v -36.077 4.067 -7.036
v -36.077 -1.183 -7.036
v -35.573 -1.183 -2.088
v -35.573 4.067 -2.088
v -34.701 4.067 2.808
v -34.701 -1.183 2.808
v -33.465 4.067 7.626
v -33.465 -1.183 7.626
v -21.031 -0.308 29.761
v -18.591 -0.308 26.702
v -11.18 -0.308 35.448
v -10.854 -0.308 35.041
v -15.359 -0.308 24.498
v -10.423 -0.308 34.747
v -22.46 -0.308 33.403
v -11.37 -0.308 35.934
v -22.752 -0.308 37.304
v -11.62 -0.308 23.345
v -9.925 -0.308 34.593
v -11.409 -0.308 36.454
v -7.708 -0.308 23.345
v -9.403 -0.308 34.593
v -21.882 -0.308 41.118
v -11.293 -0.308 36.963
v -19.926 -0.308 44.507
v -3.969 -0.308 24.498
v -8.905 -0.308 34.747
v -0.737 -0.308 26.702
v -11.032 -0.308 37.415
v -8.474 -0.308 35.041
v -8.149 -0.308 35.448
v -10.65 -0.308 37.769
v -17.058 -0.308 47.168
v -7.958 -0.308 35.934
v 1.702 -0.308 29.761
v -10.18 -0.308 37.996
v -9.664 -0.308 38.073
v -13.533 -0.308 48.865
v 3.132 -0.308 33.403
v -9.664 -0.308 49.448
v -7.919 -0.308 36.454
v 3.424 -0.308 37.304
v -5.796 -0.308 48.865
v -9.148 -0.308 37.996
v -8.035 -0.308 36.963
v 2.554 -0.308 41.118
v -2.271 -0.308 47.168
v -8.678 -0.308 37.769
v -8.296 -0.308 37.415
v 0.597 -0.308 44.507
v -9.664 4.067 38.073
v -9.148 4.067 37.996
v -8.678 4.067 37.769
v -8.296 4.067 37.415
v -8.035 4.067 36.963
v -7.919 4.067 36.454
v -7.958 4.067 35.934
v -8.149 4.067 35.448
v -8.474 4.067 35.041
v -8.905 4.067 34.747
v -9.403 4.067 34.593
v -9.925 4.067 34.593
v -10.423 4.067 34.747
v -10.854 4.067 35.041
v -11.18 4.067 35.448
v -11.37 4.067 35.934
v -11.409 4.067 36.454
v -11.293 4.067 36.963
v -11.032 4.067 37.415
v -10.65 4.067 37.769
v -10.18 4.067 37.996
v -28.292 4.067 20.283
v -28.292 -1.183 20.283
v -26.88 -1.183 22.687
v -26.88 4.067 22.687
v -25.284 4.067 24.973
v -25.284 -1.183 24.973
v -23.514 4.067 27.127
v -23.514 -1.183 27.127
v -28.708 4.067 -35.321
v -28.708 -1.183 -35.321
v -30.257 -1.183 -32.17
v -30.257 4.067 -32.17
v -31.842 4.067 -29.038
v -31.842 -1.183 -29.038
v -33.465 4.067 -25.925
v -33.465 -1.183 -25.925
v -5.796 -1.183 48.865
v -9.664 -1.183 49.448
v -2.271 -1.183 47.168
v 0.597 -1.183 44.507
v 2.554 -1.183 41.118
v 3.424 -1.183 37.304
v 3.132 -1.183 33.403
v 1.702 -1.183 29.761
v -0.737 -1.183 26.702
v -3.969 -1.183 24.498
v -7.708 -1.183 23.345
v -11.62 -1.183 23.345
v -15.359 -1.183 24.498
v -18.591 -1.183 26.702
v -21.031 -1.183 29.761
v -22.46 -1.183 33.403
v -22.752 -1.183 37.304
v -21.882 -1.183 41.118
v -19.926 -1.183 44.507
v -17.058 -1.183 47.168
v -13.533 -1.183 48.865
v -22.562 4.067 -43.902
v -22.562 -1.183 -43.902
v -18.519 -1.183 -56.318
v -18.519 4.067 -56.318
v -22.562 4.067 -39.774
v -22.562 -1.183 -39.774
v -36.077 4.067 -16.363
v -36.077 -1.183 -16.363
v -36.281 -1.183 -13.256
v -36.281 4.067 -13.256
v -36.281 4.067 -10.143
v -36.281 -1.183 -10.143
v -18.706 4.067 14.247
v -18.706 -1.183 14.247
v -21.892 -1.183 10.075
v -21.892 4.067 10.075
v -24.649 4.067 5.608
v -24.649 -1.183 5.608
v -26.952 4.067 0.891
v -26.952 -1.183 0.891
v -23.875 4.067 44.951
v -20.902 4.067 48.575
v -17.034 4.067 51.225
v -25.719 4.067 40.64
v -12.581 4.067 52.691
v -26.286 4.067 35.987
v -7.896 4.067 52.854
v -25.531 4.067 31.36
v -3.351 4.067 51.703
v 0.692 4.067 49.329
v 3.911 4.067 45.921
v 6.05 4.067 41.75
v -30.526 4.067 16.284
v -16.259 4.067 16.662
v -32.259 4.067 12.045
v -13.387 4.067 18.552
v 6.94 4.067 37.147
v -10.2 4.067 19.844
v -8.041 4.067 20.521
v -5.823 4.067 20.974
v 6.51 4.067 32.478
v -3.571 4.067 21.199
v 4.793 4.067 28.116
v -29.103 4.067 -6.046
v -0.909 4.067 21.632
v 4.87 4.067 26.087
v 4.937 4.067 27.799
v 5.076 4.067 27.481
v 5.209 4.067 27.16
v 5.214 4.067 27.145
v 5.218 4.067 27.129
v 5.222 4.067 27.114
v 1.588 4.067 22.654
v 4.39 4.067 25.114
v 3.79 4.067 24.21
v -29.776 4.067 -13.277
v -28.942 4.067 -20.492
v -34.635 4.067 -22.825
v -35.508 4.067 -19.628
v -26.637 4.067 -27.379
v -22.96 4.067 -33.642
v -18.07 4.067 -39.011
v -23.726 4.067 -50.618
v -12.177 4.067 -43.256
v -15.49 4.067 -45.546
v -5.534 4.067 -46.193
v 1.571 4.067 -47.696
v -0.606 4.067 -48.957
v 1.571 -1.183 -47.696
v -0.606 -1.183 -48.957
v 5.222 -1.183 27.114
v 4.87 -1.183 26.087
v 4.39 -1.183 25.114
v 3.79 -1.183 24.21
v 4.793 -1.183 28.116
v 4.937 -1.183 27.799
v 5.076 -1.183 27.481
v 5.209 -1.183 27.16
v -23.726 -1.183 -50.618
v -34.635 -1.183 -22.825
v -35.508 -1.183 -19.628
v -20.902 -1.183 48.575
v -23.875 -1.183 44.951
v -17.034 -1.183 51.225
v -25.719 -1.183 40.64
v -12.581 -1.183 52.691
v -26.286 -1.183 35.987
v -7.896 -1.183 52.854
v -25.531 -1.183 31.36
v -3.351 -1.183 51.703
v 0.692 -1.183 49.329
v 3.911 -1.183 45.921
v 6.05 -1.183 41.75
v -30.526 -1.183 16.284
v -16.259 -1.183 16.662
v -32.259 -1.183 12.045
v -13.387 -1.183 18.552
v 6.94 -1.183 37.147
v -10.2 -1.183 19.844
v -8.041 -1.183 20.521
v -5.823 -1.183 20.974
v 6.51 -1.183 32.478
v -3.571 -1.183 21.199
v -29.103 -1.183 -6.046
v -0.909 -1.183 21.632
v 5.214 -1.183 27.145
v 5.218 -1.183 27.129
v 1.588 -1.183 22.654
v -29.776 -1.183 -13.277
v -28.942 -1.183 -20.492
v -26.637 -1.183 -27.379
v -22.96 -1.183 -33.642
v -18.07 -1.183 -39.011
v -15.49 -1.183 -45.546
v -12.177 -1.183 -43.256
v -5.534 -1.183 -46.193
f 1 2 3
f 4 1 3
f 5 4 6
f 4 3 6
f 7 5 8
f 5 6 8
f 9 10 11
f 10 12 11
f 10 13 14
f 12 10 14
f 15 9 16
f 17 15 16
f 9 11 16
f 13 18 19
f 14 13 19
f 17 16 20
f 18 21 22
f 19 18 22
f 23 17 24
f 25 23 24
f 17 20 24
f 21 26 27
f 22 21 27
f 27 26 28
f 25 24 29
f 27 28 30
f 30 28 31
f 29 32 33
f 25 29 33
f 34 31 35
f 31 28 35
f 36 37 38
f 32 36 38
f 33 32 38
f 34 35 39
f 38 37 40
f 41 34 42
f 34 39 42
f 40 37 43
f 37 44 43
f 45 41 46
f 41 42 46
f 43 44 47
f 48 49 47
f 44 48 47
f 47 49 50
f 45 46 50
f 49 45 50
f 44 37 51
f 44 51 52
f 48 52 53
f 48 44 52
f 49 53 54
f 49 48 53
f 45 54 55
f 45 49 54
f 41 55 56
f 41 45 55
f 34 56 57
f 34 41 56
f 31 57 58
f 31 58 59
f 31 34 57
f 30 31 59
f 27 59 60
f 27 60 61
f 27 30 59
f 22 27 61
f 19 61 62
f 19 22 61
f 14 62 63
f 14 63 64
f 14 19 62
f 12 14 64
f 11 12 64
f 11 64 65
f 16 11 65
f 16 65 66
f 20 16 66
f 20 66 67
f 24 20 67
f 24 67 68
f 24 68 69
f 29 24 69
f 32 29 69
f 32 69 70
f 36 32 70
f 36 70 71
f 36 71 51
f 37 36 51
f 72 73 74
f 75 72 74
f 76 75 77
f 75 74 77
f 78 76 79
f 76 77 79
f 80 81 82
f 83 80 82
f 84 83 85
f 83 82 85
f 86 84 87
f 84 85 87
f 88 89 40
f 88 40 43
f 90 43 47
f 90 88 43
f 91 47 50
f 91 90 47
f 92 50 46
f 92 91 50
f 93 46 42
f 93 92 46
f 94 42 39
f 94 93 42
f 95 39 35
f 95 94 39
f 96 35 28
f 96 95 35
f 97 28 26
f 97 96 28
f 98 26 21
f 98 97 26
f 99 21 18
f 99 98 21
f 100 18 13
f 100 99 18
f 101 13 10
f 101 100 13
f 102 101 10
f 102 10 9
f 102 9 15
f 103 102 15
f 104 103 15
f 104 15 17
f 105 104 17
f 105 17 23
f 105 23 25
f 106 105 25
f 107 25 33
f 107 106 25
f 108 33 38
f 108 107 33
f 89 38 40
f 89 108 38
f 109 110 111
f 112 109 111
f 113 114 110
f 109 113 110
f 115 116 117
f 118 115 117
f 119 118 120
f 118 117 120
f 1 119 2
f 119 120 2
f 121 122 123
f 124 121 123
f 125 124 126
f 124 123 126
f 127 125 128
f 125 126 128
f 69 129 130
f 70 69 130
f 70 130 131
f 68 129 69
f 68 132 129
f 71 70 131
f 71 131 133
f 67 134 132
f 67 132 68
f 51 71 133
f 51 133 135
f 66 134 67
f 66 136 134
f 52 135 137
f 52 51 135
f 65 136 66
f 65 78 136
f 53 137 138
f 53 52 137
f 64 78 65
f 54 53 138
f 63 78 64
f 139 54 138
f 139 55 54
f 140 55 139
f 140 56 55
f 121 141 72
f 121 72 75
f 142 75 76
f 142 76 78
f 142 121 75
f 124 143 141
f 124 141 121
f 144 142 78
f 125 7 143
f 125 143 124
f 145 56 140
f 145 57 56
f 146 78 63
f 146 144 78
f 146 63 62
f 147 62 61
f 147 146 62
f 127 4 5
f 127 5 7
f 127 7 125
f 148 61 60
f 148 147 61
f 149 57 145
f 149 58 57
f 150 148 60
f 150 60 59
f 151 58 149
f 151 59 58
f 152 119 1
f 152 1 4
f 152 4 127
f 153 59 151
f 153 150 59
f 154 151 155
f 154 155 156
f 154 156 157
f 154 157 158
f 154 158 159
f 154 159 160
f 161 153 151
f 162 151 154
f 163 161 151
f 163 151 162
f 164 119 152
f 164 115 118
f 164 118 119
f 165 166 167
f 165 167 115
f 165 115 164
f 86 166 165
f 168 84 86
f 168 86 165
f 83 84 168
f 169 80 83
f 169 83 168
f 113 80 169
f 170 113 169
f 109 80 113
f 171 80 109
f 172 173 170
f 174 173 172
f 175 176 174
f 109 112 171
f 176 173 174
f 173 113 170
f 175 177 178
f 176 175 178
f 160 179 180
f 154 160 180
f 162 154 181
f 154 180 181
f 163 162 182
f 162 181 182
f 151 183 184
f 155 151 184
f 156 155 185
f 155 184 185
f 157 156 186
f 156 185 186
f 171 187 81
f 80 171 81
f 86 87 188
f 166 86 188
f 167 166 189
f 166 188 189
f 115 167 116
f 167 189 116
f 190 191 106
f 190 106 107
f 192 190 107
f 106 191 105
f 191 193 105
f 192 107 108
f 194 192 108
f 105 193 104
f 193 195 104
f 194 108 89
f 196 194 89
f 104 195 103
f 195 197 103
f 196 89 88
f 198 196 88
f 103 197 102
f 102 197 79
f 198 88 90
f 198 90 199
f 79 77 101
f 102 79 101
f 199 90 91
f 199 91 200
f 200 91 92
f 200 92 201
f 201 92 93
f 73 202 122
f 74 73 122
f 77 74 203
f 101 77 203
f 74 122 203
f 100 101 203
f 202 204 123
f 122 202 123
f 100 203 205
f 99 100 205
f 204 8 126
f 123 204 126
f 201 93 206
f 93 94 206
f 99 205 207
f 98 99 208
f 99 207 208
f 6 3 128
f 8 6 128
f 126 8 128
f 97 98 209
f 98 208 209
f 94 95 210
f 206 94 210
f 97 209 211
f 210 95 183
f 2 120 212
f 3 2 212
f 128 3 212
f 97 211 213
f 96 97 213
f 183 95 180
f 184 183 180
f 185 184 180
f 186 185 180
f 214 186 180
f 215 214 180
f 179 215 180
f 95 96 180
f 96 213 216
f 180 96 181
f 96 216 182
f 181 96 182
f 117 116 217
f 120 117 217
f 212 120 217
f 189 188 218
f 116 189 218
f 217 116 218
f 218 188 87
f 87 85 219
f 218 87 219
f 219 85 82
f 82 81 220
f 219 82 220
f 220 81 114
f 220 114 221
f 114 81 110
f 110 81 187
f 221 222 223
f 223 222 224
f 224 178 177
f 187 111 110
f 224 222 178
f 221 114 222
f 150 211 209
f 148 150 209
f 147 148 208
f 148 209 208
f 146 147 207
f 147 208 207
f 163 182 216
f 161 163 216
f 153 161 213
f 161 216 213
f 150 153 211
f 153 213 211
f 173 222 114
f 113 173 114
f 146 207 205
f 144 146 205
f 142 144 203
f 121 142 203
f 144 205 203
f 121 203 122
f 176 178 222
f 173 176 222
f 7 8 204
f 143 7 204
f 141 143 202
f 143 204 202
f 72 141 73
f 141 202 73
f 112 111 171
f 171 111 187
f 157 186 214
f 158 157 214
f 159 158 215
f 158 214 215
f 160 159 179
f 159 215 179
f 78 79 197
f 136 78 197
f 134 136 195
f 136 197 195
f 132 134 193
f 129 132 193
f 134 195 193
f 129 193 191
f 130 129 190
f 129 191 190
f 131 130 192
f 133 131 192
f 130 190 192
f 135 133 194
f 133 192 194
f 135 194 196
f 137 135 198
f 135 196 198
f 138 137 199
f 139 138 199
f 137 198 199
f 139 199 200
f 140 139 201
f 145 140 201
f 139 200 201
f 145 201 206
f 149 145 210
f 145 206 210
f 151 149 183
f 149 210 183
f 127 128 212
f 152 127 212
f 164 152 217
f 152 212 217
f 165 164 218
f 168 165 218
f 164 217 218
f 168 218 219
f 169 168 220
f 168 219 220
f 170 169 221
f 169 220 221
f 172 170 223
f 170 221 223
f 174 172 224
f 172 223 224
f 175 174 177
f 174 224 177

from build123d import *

# Parameters (mm, degrees)
SUNGU_KIRI_R        = 1
BOSS_EXTRUDE1_DEPTH = 3
SKETCH7_R           = 7.5
CUT_EXTRUDE2_DEPTH  = 0.5
SCALE1_SCALE        = 1.75


with BuildPart() as part:
    # sungu kiri → Boss-Extrude1 (new body)
    with BuildSketch(Plane(origin=(0, 0, 0), x_dir=(1, 0, 0), z_dir=(0, 1, 0))):
        with BuildLine():
            Line((-20.214241335, 18.58200887), (-17.903708636, 25.676772527))
            Line((-17.903708636, 25.676772527), (-20.879327355, 22.419581076))
            Line((-20.879327355, 22.419581076), (-23.726014444, 13.678492013))
            ThreePointArc((-23.726014444, 13.678492013), (-25.061399851, 10.98195956), (-26.444409257, 8.309539974))
            ThreePointArc((-26.444409257, 8.309539974), (-27.383764934, 5.63006722), (-27.936945566, 2.845115782))
            ThreePointArc((-27.936945566, 2.845115782), (-28.068014235, 0.18049064), (-27.936945566, -2.484134502))
            ThreePointArc((-27.936945566, -2.484134502), (-27.425713247, -6.715299694), (-26.444409257, -10.862727794))
            ThreePointArc((-26.444409257, -10.862727794), (-25.296755437, -14.61403578), (-23.488374839, -18.095297119))
            ThreePointArc((-23.488374839, -18.095297119), (-22.238356067, -20.131176806), (-20.758136978, -22.006357992))
            ThreePointArc((-20.758136978, -22.006357992), (-13.175246696, -36.755405871), (-4.582277955, -22.571064976))
            ThreePointArc((-4.582277955, -22.571064976), (-4.460378612, -22.299351604), (-4.344569641, -22.024987085))
            ThreePointArc((-4.344569641, -22.024987085), (-4.340995805, -22.01171692), (-4.3373846, -21.998456875))
            ThreePointArc((-4.3373846, -21.998456875), (-4.667057778, -21.129677391), (-5.155481579, -20.33916845))
            ThreePointArc((-5.155481579, -20.33916845), (-7.110923153, -19.117606911), (-9.361873626, -18.618421268))
            ThreePointArc((-9.361873626, -18.618421268), (-11.285784226, -18.376920372), (-13.150188878, -17.844238508))
            ThreePointArc((-13.150188878, -17.844238508), (-15.818147575, -16.60648921), (-18.010368345, -14.645827324))
            ThreePointArc((-18.010368345, -14.645827324), (-20.650416196, -11.005311906), (-22.72256926, -7.01414831))
            ThreePointArc((-22.72256926, -7.01414831), (-21.584958488, 10.98418111), (-6.423603233, 20.74980075))
            Line((-6.423603233, 20.74980075), (-7.667855794, 21.470443038))
            Line((-7.667855794, 21.470443038), (-16.17291449, 19.521519125))
            Line((-16.17291449, 19.521519125), (-20.214241335, 16.223172594))
            Line((-20.214241335, 16.223172594), (-20.214241335, 18.58200887))
        make_face()
        with Locations(Location((-12.843799059, -27.261189607, 0), (0, 0, 270))):
            Circle(SUNGU_KIRI_R, mode=Mode.SUBTRACT)
    extrude(amount=BOSS_EXTRUDE1_DEPTH)

    # Sketch7 → Cut-Extrude2 (cut)
    with BuildSketch(Plane(origin=(0, 0, 0), x_dir=(1, 0, 0), z_dir=(0, 1, 0))):
        with Locations(Location((-12.843799059, -27.261189607, 0), (0, 0, 270))):
            Circle(SKETCH7_R)
    extrude(amount=CUT_EXTRUDE2_DEPTH, mode=Mode.SUBTRACT)


with BuildPart() as part_1:
    # Scale1: scaled about (-17.083309672, 1.577817205, 15.178250086)
    add(part.part.scale(SCALE1_SCALE).moved(Location((12.812482254, -1.183362904, -11.383687565))))


solid = part_1.part
